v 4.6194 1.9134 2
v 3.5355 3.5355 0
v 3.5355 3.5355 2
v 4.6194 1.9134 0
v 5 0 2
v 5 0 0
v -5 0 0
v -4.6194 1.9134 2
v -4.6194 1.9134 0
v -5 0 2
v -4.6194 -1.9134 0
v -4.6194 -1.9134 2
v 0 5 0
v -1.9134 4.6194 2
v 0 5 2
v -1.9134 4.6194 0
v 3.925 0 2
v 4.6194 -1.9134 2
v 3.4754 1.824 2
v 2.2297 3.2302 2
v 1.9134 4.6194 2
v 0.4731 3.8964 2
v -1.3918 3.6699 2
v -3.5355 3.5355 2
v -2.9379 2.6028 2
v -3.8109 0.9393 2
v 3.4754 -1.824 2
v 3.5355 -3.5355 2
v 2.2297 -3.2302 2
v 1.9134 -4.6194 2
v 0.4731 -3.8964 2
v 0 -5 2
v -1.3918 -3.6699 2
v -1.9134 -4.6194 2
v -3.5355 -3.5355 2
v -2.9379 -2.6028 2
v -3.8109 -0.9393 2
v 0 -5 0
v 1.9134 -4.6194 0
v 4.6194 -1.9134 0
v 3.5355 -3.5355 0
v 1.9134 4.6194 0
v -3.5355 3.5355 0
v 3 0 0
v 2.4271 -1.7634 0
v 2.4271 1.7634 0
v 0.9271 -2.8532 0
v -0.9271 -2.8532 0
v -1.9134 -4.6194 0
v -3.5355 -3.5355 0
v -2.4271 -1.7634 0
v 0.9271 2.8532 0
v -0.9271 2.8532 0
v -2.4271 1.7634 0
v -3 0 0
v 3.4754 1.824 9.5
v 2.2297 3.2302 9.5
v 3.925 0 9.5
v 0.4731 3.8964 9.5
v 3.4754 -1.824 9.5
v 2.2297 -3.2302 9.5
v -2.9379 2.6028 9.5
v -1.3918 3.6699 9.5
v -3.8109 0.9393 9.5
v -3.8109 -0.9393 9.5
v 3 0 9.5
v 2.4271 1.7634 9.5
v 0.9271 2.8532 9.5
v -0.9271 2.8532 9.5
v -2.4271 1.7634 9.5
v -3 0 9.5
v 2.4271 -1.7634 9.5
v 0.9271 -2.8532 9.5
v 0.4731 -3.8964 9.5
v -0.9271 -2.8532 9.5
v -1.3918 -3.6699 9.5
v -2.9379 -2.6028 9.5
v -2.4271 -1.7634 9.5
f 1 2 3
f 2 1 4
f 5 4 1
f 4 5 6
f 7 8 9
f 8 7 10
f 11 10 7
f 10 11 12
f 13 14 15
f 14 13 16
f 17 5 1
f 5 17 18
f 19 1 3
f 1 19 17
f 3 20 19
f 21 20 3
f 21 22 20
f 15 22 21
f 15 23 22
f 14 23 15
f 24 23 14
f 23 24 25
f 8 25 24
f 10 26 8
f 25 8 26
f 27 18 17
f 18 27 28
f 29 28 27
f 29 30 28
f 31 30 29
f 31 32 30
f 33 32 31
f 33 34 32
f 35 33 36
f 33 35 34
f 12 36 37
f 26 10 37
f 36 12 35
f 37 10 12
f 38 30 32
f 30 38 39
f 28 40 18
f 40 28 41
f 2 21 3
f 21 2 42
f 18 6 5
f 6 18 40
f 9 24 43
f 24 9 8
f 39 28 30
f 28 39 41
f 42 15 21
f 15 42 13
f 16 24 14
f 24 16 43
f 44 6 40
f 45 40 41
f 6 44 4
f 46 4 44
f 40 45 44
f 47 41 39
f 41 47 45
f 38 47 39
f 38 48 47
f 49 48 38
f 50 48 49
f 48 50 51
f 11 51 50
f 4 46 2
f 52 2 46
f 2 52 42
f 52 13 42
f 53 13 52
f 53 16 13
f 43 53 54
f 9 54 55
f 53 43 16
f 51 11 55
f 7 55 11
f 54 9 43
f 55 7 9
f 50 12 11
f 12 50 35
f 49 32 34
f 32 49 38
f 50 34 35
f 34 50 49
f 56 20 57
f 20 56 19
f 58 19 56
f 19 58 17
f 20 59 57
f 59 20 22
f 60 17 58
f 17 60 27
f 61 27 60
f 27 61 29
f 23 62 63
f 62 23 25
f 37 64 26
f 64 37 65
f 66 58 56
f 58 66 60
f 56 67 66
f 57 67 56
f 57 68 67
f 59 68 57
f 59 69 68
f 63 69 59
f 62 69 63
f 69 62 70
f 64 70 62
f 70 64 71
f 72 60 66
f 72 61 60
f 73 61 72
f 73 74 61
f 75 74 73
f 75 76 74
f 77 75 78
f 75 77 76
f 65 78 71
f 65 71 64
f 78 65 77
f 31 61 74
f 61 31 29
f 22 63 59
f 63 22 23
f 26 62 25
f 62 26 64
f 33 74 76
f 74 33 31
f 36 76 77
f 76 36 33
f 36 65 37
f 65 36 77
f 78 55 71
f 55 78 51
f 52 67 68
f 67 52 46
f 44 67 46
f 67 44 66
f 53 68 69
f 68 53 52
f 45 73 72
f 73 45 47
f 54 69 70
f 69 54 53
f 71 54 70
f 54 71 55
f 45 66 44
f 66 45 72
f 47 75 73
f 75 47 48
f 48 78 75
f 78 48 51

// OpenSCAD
// [FL_INDEX: keywords="openscad, 3d_parametric, Pen_mount_for_CNC, csg_solid" | COT="Parametric OpenSCAD design from 3DCodeverse"]
// Title: Pen mount for CNC

//Make this slightly larger than actual pen size for a good tolerance
pencil_hole_diameter = 6; 

//make this one slightly smaller than the hole for press fit
adapter_size_diameter = 7.85; 

//Defines how long into the mount the plug goes, about 5-10mm is good for stability
Insert_length = 7.5;

// Use same diameter as in the mount
collar_diameter = 10; 

// Any height will do, about 2mm is good
collar_height = 2;



difference() {
	union() {
		cylinder(h = collar_height, r1 = collar_diameter/2, r2 = collar_diameter/2, center = false);
		translate([0, 0, collar_height]) cylinder(h = Insert_length, r1 = adapter_size_diameter/2, r2 = adapter_size_diameter/2, center = false);
	}
	translate([0, 0, -1]) cylinder(h = (Insert_length+collar_height)+2, r1 = pencil_hole_diameter/2, r2 = pencil_hole_diameter/2, center = false);
}
